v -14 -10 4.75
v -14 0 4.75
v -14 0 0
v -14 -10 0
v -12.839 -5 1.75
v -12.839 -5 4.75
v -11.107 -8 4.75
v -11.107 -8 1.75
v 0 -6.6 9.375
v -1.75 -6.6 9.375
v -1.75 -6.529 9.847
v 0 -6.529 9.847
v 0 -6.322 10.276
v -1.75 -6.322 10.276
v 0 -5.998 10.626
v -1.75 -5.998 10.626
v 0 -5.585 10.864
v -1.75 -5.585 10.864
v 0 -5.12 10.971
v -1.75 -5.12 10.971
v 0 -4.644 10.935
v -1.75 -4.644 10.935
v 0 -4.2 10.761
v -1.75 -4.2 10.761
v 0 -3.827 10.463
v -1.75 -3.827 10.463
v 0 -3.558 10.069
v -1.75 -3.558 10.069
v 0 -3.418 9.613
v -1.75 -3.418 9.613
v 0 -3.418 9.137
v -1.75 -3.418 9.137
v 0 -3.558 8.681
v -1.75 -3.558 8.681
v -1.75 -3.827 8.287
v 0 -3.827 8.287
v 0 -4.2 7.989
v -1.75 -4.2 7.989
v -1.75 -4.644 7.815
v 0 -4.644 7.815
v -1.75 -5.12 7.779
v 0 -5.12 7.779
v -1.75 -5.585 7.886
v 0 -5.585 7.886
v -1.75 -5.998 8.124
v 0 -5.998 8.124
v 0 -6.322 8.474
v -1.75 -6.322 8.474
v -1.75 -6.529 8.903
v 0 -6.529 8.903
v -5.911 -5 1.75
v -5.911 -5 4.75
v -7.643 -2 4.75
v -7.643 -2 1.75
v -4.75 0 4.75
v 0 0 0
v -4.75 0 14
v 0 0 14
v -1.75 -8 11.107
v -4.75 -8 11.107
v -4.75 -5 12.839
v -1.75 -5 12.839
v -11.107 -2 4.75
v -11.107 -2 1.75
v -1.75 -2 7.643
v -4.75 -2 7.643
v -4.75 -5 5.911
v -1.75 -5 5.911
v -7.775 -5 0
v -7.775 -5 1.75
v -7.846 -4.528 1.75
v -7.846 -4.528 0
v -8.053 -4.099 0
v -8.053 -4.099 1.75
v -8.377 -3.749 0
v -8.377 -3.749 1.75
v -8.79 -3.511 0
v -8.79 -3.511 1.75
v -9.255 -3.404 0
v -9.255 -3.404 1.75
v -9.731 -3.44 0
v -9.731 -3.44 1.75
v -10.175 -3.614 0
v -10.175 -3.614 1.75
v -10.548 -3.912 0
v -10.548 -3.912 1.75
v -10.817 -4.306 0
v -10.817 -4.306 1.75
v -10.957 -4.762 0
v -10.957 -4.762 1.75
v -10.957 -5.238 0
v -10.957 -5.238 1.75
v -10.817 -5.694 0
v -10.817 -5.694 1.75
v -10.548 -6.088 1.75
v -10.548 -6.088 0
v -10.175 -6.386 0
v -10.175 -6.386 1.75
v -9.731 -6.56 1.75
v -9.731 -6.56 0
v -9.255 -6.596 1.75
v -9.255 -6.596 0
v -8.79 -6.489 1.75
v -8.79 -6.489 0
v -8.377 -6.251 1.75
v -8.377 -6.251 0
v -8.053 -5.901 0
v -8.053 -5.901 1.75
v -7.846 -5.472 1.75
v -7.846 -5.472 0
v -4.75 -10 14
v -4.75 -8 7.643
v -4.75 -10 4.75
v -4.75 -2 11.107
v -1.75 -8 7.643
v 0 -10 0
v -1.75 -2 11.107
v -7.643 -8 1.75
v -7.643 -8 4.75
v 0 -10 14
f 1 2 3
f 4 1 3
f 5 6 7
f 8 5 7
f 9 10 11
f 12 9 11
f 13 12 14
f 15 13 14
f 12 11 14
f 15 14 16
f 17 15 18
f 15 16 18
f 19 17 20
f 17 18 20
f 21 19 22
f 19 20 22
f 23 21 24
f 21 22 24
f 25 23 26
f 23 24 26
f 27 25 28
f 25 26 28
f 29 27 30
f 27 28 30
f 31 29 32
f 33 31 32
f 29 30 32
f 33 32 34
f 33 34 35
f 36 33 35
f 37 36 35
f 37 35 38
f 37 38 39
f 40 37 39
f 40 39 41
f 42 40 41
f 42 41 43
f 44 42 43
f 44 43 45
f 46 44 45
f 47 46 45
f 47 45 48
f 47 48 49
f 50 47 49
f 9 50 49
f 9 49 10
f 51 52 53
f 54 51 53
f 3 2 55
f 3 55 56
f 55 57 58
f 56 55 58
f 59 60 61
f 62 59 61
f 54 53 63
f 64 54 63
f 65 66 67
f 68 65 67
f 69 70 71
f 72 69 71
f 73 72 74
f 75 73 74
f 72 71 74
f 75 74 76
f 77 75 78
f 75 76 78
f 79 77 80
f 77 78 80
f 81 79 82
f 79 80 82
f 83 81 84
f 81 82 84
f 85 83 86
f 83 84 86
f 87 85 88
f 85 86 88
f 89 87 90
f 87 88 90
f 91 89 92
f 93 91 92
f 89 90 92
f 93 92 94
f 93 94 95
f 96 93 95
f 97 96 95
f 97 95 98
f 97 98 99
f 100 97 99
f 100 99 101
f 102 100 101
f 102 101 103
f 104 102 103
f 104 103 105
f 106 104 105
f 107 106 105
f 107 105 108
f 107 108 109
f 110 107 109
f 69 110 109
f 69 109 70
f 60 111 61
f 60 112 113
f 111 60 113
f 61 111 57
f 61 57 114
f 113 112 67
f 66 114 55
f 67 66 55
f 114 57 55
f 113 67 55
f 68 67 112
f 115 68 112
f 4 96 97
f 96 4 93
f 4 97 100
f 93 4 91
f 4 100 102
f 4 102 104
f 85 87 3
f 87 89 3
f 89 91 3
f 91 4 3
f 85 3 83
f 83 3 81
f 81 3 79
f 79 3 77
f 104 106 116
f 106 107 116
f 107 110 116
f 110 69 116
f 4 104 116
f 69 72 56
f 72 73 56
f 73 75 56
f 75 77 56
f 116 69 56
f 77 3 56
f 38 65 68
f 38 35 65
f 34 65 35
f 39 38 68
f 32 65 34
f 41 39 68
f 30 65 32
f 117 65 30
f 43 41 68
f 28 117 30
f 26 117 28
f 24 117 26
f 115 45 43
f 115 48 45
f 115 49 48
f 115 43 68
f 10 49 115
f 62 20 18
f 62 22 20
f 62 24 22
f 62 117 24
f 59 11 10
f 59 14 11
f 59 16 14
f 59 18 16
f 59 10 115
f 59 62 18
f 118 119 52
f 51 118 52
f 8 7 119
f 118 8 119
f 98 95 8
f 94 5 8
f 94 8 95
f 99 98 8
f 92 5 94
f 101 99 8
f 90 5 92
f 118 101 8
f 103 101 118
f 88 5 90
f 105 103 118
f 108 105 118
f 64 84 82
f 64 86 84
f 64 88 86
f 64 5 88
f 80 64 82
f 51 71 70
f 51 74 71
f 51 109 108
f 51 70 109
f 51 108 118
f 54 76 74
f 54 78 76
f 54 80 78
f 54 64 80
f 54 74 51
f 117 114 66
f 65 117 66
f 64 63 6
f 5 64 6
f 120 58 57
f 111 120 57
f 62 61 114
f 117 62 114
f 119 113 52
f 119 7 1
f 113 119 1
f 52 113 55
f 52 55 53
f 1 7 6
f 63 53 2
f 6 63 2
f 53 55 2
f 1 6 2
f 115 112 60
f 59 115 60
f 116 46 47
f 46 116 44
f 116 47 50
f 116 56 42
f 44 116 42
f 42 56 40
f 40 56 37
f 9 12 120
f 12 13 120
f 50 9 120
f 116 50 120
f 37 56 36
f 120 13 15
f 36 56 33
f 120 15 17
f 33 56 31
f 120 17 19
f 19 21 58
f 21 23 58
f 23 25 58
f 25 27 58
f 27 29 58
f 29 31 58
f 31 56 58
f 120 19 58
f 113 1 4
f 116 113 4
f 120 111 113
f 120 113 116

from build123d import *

# Parameters (mm, degrees)
F1_DEPTH  = 10
F2_R      = 1.6
F3_DEPTH  = 3
F3_FACE_R = 1.6
F4_DEPTH  = 25
F5_R      = 1.6
F6_DEPTH  = 3
F6_FACE_R = 1.6
F7_DEPTH  = 25


with BuildPart() as f1:
    # F0 (on Front) → F1 (new body)
    with BuildSketch(Plane.XZ):
        Polygon((-14, 0), (0, 0), (0, 14), (-4.75, 14), (-4.75, 4.75), (-14, 4.75), align=None)
    extrude(amount=F1_DEPTH)

    # F2 (on face) → F3 (cut)
    with BuildSketch(Plane(origin=(-4.75, 0, 0), x_dir=(0, -1, 0), z_dir=(-1, 0, 0))):
        Polygon((2, 11.107051), (2, 7.642949), (5, 5.910898), (8, 7.642949), (8, 11.107051), (5, 12.839102), align=None)
        with Locations((5, 9.375)):
            Circle(F2_R, mode=Mode.SUBTRACT)
    extrude(amount=-F3_DEPTH, mode=Mode.SUBTRACT)

    # F3_face (on face) → F4 (cut)
    with BuildSketch(Plane(origin=(-4.75, -5, 9.375), x_dir=(0, -1, 0), z_dir=(-1, 0, 0))):
        Circle(F3_FACE_R)
    extrude(amount=-F4_DEPTH, mode=Mode.SUBTRACT)

    # F5 (on face) → F6 (cut)
    with BuildSketch(Plane.XY.offset(4.75)):
        Polygon((-11.107051, -8), (-7.642949, -8), (-5.910898, -5), (-7.642949, -2), (-11.107051, -2), (-12.839102, -5), align=None)
        with Locations((-9.375, -5)):
            Circle(F5_R, mode=Mode.SUBTRACT)
    extrude(amount=-F6_DEPTH, mode=Mode.SUBTRACT)

    # F6_face (on face) → F7 (cut)
    with BuildSketch(Plane(origin=(-9.375, -5, 4.75), x_dir=(1, 0, 0), z_dir=(0, 0, 1))):
        Circle(F6_FACE_R)
    extrude(amount=-F7_DEPTH, mode=Mode.SUBTRACT)


solid = f1.part
